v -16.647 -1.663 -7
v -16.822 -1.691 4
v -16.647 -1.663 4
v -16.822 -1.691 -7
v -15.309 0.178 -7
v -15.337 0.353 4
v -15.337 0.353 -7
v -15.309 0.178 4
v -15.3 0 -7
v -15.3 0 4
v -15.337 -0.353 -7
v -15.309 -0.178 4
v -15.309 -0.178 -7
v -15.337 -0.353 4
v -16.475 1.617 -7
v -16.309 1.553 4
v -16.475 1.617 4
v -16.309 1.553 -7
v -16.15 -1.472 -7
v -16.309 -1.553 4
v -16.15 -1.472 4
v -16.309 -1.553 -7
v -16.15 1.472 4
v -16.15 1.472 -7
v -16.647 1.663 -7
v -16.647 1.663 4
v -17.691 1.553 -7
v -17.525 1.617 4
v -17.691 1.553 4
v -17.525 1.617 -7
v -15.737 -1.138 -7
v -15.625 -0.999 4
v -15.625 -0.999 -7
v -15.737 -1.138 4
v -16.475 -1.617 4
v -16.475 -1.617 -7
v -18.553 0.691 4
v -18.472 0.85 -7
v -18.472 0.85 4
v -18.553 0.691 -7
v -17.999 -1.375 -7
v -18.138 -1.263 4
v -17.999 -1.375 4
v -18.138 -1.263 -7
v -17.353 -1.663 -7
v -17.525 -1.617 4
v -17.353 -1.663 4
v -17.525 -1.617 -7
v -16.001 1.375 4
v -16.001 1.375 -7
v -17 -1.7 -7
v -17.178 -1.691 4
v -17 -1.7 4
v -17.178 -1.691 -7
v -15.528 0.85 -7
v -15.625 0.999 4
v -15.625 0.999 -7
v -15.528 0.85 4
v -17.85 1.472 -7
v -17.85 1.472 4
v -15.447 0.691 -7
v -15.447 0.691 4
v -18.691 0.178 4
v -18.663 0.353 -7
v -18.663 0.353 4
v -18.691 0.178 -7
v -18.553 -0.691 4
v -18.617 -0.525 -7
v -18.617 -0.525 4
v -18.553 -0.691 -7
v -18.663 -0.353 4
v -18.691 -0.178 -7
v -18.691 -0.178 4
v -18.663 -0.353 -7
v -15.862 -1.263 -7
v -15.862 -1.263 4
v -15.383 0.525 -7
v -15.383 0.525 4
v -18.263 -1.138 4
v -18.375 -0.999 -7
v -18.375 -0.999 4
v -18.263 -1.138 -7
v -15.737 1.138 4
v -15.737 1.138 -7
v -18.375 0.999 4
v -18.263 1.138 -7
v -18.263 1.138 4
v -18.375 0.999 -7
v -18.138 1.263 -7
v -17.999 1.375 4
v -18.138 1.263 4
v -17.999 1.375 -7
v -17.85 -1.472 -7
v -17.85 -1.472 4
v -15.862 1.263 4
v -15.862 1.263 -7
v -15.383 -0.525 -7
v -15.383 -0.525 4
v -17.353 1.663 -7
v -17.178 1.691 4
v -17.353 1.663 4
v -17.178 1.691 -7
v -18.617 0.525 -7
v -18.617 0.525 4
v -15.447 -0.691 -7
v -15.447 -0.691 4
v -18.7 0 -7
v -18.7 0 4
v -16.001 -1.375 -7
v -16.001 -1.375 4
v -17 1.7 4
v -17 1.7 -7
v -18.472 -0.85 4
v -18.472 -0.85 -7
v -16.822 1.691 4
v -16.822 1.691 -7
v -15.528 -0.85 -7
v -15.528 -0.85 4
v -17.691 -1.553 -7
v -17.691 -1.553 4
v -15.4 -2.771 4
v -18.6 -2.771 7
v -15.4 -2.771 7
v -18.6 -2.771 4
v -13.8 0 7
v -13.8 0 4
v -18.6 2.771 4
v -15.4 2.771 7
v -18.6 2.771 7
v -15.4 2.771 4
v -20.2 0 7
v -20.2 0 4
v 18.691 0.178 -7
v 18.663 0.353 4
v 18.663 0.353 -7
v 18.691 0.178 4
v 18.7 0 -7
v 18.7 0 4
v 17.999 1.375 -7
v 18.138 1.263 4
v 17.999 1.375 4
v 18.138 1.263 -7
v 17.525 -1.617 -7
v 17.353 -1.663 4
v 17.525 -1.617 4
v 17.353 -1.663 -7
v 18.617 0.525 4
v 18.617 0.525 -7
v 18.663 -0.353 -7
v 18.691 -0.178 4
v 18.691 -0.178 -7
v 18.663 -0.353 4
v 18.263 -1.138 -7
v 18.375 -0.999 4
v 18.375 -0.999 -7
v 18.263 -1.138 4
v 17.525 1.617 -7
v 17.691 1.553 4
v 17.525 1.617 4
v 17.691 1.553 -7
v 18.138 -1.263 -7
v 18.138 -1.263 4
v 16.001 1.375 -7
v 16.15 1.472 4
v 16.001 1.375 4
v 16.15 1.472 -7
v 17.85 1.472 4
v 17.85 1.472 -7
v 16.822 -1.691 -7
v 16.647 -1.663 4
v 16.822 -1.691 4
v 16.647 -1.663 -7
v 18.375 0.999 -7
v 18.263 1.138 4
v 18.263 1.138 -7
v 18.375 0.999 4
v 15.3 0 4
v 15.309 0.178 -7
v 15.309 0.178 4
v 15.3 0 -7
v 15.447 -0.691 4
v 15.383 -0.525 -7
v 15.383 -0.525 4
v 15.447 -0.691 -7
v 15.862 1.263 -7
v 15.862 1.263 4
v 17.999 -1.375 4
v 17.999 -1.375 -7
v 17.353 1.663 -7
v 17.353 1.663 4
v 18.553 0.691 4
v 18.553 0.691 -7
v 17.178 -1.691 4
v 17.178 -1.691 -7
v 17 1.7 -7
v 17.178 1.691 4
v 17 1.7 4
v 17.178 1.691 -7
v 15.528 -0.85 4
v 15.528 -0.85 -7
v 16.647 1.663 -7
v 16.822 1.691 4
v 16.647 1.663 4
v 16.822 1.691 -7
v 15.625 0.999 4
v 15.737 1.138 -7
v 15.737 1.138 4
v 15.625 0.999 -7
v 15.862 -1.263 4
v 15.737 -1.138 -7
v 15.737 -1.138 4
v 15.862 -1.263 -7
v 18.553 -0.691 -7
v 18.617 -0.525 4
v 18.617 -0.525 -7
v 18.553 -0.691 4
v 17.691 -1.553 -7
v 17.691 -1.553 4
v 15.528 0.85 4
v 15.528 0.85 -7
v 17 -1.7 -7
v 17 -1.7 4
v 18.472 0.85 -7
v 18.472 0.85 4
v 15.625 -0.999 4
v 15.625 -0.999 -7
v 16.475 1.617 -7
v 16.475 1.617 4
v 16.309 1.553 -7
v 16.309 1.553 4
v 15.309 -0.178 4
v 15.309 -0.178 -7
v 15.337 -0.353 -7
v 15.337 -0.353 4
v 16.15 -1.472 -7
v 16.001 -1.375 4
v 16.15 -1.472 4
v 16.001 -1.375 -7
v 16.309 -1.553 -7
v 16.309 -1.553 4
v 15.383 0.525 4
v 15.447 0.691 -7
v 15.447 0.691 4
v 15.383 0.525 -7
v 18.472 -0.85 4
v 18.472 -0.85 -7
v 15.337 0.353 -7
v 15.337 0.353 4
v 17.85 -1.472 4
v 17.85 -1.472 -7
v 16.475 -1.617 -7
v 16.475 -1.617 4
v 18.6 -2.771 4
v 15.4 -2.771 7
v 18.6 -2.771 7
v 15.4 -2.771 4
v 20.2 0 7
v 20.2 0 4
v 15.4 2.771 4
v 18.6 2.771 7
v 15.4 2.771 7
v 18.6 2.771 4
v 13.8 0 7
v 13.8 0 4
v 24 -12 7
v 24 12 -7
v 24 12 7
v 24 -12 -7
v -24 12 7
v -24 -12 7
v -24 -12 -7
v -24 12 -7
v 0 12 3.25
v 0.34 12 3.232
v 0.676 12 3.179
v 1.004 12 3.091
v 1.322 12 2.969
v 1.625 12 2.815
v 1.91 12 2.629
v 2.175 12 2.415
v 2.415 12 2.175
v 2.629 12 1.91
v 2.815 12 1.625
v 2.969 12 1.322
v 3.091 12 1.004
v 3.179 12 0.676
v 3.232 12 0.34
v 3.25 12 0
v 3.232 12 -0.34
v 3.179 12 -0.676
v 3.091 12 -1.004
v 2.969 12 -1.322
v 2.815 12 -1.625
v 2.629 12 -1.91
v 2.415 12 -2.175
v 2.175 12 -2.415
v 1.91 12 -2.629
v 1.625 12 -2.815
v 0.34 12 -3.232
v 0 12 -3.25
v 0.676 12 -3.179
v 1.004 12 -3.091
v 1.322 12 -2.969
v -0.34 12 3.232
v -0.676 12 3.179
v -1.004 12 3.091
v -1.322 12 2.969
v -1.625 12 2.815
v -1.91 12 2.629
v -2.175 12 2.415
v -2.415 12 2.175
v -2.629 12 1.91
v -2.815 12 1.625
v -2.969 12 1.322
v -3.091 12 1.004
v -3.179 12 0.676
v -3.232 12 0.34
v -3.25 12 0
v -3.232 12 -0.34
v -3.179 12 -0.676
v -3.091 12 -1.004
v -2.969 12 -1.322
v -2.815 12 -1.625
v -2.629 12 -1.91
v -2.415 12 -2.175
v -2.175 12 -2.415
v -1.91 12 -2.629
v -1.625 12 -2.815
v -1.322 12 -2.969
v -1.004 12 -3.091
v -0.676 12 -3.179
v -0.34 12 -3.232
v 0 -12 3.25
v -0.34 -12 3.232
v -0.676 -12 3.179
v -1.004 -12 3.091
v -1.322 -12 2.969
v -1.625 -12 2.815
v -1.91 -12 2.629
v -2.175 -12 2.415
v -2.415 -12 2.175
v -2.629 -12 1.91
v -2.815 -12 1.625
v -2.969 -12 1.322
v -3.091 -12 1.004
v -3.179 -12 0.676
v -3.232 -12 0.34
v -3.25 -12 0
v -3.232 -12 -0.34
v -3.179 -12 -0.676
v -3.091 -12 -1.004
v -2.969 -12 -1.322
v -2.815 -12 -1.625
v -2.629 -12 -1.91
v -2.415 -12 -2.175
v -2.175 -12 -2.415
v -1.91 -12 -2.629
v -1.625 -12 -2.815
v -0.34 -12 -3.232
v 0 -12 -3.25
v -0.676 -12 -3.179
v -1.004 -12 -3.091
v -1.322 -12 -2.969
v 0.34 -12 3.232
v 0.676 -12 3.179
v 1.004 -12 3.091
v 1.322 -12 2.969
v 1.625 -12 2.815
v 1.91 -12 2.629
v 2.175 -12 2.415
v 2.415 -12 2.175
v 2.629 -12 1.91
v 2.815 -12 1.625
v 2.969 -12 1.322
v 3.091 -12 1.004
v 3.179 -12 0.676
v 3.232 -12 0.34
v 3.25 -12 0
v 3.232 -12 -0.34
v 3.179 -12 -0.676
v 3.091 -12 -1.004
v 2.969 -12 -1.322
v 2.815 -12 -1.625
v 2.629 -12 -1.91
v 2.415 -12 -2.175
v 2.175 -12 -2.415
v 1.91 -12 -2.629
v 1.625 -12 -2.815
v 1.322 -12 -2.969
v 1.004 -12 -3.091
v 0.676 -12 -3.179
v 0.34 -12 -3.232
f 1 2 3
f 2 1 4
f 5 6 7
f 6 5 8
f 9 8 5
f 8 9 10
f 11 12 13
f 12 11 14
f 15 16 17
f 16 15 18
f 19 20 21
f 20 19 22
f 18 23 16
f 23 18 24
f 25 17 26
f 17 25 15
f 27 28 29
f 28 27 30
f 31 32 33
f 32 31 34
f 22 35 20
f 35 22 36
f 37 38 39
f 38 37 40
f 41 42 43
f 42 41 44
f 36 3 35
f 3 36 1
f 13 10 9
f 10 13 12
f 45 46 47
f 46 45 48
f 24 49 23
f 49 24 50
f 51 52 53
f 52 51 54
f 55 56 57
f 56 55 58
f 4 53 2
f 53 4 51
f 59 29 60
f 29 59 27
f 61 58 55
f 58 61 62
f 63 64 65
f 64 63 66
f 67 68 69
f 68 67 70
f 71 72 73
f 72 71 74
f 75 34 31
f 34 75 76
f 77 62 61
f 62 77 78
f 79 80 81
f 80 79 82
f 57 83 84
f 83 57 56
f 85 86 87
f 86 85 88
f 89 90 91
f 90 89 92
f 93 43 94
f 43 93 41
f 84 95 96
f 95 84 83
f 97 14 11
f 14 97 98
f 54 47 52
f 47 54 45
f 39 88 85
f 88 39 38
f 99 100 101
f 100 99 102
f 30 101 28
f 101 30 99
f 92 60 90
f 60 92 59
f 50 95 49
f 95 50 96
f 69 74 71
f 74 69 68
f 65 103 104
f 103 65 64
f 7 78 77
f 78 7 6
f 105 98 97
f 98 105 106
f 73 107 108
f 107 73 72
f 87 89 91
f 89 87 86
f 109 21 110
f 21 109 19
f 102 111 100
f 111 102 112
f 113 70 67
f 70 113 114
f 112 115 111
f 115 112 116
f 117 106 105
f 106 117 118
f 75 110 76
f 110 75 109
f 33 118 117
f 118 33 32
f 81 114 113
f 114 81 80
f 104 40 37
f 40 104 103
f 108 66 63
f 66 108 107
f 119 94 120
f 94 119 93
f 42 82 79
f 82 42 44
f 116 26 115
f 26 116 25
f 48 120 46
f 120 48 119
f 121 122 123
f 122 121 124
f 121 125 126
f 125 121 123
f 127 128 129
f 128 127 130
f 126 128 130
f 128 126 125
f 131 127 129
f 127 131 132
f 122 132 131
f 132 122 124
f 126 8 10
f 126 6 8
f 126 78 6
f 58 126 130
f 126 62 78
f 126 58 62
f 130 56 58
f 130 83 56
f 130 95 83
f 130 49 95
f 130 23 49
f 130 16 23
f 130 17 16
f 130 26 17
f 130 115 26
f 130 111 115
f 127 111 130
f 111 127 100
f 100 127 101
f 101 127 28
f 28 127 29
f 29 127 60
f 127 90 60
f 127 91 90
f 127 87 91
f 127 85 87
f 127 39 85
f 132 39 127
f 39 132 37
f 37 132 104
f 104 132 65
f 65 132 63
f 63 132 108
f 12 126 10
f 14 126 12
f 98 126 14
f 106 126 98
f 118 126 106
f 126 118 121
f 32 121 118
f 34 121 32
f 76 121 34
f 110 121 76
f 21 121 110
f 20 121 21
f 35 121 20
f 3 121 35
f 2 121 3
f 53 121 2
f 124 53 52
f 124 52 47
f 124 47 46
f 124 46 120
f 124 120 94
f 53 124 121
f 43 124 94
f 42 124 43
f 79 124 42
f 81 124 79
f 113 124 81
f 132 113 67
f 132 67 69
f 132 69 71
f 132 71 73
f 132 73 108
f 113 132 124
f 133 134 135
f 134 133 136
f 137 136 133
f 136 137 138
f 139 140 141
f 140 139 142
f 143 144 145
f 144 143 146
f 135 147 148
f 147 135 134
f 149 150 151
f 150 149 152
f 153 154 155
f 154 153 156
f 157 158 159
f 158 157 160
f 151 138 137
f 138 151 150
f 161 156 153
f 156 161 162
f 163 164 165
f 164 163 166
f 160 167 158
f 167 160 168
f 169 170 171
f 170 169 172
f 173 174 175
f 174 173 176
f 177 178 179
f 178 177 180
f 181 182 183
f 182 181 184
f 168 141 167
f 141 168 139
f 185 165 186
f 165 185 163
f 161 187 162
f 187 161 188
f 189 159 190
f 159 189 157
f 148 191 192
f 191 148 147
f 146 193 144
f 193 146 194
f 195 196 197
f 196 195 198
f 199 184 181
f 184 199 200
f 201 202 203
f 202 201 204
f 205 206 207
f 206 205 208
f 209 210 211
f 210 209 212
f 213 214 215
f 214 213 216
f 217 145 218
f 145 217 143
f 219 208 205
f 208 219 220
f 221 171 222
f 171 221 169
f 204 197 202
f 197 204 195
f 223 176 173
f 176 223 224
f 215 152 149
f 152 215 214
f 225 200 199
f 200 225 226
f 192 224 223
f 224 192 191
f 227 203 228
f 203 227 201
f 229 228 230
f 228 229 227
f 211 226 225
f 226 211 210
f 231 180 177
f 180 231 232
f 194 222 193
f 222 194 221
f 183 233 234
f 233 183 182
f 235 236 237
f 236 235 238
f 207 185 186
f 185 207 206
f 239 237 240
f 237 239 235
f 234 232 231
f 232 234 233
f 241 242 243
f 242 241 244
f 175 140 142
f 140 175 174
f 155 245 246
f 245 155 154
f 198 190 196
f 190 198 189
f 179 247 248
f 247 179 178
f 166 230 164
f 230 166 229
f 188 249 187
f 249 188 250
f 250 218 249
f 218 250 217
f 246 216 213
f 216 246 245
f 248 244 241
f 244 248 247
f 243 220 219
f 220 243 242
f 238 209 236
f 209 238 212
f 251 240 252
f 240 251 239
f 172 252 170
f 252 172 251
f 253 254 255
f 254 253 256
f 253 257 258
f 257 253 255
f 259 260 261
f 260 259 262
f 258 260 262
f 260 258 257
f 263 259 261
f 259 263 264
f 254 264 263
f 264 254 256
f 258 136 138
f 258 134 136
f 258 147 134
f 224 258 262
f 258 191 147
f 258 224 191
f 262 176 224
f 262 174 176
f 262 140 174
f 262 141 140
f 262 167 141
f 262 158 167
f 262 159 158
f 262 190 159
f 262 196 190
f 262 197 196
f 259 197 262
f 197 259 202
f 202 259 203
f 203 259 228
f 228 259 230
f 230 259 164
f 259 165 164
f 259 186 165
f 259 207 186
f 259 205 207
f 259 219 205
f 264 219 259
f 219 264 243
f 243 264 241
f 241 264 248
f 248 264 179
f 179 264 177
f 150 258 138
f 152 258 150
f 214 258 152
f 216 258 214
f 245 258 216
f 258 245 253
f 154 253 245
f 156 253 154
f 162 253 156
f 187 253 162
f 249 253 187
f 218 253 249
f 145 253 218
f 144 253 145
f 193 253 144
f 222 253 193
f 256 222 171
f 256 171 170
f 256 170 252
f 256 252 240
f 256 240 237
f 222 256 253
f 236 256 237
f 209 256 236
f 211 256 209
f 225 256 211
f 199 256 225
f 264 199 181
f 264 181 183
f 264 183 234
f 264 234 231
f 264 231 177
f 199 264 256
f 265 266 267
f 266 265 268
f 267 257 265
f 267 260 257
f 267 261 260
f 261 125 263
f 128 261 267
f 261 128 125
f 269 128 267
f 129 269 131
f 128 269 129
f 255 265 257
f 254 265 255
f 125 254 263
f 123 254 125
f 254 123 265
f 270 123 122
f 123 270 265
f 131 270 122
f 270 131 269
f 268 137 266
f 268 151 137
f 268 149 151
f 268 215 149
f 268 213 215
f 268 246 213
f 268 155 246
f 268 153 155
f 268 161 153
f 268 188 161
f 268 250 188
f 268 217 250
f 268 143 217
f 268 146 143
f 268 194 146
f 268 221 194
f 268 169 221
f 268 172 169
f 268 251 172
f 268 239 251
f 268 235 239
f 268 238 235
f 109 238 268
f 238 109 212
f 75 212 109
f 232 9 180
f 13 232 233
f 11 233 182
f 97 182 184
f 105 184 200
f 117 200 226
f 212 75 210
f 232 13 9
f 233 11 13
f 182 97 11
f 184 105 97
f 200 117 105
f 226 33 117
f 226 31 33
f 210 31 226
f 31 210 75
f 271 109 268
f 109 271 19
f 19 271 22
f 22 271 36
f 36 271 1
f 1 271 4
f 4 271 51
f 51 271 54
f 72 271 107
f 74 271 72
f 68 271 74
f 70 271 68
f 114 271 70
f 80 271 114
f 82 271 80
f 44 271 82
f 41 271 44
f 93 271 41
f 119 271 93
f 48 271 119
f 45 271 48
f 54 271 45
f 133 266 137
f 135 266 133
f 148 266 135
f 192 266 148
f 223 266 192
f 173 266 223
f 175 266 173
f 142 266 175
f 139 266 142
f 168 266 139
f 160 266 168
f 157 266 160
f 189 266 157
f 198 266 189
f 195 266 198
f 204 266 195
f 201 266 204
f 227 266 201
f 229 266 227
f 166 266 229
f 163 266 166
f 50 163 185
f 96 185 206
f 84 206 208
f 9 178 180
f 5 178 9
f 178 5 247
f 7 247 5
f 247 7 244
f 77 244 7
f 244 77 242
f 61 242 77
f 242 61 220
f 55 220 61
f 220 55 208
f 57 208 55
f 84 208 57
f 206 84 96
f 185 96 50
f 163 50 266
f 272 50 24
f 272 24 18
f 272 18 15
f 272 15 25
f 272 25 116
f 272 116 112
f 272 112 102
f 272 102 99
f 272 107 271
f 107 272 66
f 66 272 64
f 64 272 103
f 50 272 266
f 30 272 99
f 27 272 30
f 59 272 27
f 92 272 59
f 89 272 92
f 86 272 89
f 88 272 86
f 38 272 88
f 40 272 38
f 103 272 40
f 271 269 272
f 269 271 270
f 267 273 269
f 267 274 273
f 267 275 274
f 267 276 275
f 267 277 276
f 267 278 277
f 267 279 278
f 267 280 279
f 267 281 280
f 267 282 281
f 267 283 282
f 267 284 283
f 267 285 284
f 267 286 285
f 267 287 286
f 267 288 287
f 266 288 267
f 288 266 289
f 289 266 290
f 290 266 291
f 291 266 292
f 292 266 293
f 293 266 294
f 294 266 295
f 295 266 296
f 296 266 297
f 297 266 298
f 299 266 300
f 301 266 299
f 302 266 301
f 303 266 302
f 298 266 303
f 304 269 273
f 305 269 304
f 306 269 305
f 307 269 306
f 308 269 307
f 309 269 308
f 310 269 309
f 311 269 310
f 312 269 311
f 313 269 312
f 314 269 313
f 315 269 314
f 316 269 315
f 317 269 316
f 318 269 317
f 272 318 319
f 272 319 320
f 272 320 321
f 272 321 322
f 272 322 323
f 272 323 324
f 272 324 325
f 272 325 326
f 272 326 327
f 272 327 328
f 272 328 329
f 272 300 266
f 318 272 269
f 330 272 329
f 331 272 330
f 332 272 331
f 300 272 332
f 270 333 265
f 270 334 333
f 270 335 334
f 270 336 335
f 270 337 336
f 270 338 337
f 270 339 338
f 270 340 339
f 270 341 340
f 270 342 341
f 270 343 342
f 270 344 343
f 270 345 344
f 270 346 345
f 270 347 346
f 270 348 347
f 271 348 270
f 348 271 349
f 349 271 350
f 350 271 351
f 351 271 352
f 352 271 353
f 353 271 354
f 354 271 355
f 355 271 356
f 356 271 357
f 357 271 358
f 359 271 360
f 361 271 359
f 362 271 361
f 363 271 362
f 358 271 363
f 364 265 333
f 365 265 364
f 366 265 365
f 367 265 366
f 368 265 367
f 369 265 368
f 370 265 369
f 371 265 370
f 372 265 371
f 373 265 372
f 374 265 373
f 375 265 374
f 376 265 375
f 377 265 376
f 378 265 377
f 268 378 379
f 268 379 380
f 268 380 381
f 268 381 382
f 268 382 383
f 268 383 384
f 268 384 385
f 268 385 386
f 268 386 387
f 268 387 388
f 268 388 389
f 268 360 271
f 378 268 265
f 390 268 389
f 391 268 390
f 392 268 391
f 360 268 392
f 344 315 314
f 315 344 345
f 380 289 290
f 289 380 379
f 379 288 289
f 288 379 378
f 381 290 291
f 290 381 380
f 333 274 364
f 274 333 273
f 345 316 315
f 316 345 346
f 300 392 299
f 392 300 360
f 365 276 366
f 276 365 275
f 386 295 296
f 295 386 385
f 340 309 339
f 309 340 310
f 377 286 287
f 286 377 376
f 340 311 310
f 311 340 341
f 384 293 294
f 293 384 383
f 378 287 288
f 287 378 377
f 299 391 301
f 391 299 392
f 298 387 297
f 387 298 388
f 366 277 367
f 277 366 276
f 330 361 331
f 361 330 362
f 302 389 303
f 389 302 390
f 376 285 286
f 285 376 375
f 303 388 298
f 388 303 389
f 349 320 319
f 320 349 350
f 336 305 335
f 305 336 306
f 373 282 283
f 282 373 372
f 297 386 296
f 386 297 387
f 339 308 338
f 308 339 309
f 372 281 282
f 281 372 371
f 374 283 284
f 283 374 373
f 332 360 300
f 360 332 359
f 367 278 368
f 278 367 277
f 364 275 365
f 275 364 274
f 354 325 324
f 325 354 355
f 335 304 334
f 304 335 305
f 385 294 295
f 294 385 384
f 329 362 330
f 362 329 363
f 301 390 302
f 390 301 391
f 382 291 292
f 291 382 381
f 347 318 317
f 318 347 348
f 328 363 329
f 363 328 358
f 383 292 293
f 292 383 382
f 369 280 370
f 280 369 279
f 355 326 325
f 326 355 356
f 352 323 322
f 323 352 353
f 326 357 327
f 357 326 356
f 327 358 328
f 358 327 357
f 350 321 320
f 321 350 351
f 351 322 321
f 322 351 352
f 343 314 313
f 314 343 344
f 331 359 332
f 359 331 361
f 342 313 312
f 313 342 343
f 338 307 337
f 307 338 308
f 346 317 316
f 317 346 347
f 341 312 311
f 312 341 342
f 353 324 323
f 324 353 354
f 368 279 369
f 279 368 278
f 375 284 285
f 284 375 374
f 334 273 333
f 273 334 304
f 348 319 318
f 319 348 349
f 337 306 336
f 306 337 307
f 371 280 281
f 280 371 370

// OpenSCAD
// Cable strain-relief clamp: two-bolt cable strain-relief clamp for a 6 mm cable bundle.
$fn = 60;
eps = 0.02;
body_l = 48;
body_w = 24;
body_h = 14;
cable_d = 6.5;
bolt_d = 3.4;
bolt_pitch = 34;

difference() {
    cube([body_l, body_w, body_h], center = true);
    translate([0, -body_w / 2 - eps, 0]) rotate([-90, 0, 0])
        cylinder(d = cable_d, h = body_w + 2 * eps);
    for (x = [-bolt_pitch / 2, bolt_pitch / 2]) {
        translate([x, 0, -body_h / 2 - eps]) cylinder(d = bolt_d, h = body_h + 2 * eps);
        translate([x, 0, body_h / 2 - 3]) cylinder(d = 6.4, h = 3 + eps, $fn = 6);
    }
}
